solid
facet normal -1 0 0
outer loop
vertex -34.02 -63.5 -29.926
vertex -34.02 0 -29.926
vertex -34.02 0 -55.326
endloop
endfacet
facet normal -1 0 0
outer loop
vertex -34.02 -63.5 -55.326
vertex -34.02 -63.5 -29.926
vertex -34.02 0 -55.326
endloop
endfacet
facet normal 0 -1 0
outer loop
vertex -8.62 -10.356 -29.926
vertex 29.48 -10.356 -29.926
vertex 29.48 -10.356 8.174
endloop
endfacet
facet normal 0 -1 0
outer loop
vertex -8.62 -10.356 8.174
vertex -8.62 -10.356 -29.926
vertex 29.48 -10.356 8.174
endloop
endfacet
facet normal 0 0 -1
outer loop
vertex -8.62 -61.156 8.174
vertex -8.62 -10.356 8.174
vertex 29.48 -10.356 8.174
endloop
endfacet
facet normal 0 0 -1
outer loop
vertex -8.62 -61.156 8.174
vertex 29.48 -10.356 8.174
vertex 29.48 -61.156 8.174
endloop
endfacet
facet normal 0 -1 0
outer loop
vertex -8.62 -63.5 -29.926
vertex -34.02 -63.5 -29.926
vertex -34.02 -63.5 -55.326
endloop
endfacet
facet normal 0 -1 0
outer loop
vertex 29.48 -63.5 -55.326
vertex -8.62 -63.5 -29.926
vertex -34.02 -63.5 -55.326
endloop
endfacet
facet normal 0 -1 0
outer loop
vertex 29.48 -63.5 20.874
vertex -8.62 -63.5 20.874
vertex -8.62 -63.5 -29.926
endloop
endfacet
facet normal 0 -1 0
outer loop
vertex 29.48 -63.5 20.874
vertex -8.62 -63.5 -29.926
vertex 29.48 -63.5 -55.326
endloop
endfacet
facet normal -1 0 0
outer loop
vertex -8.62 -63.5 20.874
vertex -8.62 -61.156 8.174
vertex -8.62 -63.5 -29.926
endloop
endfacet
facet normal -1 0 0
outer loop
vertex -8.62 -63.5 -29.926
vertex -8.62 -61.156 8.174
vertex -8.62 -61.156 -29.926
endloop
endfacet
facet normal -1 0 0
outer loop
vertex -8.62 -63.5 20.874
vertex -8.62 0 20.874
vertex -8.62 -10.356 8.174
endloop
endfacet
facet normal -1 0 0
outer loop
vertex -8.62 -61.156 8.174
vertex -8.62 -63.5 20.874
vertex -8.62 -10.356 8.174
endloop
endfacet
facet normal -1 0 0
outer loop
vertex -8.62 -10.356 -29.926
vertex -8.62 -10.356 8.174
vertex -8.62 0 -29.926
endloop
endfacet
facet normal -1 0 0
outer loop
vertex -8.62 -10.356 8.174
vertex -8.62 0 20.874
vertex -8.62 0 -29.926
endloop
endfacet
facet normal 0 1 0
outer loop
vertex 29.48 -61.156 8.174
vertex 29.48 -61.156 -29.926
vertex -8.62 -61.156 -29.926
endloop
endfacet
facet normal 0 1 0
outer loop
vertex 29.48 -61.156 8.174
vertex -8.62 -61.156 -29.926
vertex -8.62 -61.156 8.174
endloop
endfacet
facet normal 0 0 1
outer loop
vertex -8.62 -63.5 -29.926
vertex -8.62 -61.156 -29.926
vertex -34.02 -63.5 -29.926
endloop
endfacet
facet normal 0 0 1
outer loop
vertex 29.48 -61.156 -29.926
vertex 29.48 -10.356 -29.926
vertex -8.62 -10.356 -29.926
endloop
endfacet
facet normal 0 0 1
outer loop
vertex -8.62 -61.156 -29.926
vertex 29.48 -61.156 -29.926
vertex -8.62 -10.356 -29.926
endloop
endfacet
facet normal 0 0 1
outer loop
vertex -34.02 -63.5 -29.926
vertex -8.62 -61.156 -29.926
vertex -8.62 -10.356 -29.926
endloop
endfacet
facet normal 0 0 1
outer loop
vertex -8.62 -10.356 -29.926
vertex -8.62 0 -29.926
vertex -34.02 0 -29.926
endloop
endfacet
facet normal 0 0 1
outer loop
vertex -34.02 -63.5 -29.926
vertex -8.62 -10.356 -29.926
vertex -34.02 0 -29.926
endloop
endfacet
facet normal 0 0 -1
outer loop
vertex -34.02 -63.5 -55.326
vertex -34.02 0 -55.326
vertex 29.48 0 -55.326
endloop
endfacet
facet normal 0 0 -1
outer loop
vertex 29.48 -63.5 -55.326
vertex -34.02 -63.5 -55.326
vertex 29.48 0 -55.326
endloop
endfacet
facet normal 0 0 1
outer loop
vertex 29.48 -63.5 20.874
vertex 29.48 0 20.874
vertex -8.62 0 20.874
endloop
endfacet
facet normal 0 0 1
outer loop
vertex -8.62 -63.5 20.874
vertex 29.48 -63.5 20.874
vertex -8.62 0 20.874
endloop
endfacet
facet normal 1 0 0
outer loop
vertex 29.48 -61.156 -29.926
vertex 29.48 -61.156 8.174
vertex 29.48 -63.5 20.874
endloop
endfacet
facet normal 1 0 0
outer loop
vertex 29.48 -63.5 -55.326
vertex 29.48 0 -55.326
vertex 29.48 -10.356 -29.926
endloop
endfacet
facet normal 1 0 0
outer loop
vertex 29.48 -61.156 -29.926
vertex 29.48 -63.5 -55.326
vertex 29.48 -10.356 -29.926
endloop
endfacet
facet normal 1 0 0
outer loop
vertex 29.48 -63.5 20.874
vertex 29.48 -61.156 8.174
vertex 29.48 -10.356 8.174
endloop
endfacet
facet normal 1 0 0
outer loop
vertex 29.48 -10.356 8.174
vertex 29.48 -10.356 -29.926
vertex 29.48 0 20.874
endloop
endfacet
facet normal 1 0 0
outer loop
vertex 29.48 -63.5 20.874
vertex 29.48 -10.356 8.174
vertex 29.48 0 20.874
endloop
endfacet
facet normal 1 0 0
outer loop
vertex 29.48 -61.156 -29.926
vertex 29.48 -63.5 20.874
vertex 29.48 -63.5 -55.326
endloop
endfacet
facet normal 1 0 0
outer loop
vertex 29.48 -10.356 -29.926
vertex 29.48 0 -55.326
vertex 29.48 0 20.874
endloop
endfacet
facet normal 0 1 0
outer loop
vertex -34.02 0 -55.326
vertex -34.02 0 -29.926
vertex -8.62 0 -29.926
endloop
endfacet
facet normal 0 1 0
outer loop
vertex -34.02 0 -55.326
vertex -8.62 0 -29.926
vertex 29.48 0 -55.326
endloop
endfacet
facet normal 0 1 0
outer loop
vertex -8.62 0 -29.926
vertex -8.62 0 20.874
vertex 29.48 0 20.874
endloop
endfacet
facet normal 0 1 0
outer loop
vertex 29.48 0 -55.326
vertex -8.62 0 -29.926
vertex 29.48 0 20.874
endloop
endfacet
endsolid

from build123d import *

# Parameters (mm, degrees)
F1_DEPTH = 63.5
F2_W     = 50.8
F2_H     = 38.1
F3_DEPTH = 50.8


with BuildPart() as f1:
    # F0 (on Front) → F1 (new body)
    with BuildSketch(Plane.XZ):
        Polygon((-34.019788, -29.926063), (-34.019788, -55.326063), (29.480212, -55.326063), (29.480212, 20.873937), (-8.619788, 20.873937), (-8.619788, -29.926063), align=None)
    extrude(amount=F1_DEPTH)

    # F2 (on face) → F3 (cut)
    with BuildSketch(Plane(origin=(-8.619788, 0, 0), x_dir=(0, -1, 0), z_dir=(-1, 0, 0))):
        with Locations((35.755906, -10.876063)):
            Rectangle(F2_W, F2_H)
    extrude(amount=-F3_DEPTH, mode=Mode.SUBTRACT)


solid = f1.part
